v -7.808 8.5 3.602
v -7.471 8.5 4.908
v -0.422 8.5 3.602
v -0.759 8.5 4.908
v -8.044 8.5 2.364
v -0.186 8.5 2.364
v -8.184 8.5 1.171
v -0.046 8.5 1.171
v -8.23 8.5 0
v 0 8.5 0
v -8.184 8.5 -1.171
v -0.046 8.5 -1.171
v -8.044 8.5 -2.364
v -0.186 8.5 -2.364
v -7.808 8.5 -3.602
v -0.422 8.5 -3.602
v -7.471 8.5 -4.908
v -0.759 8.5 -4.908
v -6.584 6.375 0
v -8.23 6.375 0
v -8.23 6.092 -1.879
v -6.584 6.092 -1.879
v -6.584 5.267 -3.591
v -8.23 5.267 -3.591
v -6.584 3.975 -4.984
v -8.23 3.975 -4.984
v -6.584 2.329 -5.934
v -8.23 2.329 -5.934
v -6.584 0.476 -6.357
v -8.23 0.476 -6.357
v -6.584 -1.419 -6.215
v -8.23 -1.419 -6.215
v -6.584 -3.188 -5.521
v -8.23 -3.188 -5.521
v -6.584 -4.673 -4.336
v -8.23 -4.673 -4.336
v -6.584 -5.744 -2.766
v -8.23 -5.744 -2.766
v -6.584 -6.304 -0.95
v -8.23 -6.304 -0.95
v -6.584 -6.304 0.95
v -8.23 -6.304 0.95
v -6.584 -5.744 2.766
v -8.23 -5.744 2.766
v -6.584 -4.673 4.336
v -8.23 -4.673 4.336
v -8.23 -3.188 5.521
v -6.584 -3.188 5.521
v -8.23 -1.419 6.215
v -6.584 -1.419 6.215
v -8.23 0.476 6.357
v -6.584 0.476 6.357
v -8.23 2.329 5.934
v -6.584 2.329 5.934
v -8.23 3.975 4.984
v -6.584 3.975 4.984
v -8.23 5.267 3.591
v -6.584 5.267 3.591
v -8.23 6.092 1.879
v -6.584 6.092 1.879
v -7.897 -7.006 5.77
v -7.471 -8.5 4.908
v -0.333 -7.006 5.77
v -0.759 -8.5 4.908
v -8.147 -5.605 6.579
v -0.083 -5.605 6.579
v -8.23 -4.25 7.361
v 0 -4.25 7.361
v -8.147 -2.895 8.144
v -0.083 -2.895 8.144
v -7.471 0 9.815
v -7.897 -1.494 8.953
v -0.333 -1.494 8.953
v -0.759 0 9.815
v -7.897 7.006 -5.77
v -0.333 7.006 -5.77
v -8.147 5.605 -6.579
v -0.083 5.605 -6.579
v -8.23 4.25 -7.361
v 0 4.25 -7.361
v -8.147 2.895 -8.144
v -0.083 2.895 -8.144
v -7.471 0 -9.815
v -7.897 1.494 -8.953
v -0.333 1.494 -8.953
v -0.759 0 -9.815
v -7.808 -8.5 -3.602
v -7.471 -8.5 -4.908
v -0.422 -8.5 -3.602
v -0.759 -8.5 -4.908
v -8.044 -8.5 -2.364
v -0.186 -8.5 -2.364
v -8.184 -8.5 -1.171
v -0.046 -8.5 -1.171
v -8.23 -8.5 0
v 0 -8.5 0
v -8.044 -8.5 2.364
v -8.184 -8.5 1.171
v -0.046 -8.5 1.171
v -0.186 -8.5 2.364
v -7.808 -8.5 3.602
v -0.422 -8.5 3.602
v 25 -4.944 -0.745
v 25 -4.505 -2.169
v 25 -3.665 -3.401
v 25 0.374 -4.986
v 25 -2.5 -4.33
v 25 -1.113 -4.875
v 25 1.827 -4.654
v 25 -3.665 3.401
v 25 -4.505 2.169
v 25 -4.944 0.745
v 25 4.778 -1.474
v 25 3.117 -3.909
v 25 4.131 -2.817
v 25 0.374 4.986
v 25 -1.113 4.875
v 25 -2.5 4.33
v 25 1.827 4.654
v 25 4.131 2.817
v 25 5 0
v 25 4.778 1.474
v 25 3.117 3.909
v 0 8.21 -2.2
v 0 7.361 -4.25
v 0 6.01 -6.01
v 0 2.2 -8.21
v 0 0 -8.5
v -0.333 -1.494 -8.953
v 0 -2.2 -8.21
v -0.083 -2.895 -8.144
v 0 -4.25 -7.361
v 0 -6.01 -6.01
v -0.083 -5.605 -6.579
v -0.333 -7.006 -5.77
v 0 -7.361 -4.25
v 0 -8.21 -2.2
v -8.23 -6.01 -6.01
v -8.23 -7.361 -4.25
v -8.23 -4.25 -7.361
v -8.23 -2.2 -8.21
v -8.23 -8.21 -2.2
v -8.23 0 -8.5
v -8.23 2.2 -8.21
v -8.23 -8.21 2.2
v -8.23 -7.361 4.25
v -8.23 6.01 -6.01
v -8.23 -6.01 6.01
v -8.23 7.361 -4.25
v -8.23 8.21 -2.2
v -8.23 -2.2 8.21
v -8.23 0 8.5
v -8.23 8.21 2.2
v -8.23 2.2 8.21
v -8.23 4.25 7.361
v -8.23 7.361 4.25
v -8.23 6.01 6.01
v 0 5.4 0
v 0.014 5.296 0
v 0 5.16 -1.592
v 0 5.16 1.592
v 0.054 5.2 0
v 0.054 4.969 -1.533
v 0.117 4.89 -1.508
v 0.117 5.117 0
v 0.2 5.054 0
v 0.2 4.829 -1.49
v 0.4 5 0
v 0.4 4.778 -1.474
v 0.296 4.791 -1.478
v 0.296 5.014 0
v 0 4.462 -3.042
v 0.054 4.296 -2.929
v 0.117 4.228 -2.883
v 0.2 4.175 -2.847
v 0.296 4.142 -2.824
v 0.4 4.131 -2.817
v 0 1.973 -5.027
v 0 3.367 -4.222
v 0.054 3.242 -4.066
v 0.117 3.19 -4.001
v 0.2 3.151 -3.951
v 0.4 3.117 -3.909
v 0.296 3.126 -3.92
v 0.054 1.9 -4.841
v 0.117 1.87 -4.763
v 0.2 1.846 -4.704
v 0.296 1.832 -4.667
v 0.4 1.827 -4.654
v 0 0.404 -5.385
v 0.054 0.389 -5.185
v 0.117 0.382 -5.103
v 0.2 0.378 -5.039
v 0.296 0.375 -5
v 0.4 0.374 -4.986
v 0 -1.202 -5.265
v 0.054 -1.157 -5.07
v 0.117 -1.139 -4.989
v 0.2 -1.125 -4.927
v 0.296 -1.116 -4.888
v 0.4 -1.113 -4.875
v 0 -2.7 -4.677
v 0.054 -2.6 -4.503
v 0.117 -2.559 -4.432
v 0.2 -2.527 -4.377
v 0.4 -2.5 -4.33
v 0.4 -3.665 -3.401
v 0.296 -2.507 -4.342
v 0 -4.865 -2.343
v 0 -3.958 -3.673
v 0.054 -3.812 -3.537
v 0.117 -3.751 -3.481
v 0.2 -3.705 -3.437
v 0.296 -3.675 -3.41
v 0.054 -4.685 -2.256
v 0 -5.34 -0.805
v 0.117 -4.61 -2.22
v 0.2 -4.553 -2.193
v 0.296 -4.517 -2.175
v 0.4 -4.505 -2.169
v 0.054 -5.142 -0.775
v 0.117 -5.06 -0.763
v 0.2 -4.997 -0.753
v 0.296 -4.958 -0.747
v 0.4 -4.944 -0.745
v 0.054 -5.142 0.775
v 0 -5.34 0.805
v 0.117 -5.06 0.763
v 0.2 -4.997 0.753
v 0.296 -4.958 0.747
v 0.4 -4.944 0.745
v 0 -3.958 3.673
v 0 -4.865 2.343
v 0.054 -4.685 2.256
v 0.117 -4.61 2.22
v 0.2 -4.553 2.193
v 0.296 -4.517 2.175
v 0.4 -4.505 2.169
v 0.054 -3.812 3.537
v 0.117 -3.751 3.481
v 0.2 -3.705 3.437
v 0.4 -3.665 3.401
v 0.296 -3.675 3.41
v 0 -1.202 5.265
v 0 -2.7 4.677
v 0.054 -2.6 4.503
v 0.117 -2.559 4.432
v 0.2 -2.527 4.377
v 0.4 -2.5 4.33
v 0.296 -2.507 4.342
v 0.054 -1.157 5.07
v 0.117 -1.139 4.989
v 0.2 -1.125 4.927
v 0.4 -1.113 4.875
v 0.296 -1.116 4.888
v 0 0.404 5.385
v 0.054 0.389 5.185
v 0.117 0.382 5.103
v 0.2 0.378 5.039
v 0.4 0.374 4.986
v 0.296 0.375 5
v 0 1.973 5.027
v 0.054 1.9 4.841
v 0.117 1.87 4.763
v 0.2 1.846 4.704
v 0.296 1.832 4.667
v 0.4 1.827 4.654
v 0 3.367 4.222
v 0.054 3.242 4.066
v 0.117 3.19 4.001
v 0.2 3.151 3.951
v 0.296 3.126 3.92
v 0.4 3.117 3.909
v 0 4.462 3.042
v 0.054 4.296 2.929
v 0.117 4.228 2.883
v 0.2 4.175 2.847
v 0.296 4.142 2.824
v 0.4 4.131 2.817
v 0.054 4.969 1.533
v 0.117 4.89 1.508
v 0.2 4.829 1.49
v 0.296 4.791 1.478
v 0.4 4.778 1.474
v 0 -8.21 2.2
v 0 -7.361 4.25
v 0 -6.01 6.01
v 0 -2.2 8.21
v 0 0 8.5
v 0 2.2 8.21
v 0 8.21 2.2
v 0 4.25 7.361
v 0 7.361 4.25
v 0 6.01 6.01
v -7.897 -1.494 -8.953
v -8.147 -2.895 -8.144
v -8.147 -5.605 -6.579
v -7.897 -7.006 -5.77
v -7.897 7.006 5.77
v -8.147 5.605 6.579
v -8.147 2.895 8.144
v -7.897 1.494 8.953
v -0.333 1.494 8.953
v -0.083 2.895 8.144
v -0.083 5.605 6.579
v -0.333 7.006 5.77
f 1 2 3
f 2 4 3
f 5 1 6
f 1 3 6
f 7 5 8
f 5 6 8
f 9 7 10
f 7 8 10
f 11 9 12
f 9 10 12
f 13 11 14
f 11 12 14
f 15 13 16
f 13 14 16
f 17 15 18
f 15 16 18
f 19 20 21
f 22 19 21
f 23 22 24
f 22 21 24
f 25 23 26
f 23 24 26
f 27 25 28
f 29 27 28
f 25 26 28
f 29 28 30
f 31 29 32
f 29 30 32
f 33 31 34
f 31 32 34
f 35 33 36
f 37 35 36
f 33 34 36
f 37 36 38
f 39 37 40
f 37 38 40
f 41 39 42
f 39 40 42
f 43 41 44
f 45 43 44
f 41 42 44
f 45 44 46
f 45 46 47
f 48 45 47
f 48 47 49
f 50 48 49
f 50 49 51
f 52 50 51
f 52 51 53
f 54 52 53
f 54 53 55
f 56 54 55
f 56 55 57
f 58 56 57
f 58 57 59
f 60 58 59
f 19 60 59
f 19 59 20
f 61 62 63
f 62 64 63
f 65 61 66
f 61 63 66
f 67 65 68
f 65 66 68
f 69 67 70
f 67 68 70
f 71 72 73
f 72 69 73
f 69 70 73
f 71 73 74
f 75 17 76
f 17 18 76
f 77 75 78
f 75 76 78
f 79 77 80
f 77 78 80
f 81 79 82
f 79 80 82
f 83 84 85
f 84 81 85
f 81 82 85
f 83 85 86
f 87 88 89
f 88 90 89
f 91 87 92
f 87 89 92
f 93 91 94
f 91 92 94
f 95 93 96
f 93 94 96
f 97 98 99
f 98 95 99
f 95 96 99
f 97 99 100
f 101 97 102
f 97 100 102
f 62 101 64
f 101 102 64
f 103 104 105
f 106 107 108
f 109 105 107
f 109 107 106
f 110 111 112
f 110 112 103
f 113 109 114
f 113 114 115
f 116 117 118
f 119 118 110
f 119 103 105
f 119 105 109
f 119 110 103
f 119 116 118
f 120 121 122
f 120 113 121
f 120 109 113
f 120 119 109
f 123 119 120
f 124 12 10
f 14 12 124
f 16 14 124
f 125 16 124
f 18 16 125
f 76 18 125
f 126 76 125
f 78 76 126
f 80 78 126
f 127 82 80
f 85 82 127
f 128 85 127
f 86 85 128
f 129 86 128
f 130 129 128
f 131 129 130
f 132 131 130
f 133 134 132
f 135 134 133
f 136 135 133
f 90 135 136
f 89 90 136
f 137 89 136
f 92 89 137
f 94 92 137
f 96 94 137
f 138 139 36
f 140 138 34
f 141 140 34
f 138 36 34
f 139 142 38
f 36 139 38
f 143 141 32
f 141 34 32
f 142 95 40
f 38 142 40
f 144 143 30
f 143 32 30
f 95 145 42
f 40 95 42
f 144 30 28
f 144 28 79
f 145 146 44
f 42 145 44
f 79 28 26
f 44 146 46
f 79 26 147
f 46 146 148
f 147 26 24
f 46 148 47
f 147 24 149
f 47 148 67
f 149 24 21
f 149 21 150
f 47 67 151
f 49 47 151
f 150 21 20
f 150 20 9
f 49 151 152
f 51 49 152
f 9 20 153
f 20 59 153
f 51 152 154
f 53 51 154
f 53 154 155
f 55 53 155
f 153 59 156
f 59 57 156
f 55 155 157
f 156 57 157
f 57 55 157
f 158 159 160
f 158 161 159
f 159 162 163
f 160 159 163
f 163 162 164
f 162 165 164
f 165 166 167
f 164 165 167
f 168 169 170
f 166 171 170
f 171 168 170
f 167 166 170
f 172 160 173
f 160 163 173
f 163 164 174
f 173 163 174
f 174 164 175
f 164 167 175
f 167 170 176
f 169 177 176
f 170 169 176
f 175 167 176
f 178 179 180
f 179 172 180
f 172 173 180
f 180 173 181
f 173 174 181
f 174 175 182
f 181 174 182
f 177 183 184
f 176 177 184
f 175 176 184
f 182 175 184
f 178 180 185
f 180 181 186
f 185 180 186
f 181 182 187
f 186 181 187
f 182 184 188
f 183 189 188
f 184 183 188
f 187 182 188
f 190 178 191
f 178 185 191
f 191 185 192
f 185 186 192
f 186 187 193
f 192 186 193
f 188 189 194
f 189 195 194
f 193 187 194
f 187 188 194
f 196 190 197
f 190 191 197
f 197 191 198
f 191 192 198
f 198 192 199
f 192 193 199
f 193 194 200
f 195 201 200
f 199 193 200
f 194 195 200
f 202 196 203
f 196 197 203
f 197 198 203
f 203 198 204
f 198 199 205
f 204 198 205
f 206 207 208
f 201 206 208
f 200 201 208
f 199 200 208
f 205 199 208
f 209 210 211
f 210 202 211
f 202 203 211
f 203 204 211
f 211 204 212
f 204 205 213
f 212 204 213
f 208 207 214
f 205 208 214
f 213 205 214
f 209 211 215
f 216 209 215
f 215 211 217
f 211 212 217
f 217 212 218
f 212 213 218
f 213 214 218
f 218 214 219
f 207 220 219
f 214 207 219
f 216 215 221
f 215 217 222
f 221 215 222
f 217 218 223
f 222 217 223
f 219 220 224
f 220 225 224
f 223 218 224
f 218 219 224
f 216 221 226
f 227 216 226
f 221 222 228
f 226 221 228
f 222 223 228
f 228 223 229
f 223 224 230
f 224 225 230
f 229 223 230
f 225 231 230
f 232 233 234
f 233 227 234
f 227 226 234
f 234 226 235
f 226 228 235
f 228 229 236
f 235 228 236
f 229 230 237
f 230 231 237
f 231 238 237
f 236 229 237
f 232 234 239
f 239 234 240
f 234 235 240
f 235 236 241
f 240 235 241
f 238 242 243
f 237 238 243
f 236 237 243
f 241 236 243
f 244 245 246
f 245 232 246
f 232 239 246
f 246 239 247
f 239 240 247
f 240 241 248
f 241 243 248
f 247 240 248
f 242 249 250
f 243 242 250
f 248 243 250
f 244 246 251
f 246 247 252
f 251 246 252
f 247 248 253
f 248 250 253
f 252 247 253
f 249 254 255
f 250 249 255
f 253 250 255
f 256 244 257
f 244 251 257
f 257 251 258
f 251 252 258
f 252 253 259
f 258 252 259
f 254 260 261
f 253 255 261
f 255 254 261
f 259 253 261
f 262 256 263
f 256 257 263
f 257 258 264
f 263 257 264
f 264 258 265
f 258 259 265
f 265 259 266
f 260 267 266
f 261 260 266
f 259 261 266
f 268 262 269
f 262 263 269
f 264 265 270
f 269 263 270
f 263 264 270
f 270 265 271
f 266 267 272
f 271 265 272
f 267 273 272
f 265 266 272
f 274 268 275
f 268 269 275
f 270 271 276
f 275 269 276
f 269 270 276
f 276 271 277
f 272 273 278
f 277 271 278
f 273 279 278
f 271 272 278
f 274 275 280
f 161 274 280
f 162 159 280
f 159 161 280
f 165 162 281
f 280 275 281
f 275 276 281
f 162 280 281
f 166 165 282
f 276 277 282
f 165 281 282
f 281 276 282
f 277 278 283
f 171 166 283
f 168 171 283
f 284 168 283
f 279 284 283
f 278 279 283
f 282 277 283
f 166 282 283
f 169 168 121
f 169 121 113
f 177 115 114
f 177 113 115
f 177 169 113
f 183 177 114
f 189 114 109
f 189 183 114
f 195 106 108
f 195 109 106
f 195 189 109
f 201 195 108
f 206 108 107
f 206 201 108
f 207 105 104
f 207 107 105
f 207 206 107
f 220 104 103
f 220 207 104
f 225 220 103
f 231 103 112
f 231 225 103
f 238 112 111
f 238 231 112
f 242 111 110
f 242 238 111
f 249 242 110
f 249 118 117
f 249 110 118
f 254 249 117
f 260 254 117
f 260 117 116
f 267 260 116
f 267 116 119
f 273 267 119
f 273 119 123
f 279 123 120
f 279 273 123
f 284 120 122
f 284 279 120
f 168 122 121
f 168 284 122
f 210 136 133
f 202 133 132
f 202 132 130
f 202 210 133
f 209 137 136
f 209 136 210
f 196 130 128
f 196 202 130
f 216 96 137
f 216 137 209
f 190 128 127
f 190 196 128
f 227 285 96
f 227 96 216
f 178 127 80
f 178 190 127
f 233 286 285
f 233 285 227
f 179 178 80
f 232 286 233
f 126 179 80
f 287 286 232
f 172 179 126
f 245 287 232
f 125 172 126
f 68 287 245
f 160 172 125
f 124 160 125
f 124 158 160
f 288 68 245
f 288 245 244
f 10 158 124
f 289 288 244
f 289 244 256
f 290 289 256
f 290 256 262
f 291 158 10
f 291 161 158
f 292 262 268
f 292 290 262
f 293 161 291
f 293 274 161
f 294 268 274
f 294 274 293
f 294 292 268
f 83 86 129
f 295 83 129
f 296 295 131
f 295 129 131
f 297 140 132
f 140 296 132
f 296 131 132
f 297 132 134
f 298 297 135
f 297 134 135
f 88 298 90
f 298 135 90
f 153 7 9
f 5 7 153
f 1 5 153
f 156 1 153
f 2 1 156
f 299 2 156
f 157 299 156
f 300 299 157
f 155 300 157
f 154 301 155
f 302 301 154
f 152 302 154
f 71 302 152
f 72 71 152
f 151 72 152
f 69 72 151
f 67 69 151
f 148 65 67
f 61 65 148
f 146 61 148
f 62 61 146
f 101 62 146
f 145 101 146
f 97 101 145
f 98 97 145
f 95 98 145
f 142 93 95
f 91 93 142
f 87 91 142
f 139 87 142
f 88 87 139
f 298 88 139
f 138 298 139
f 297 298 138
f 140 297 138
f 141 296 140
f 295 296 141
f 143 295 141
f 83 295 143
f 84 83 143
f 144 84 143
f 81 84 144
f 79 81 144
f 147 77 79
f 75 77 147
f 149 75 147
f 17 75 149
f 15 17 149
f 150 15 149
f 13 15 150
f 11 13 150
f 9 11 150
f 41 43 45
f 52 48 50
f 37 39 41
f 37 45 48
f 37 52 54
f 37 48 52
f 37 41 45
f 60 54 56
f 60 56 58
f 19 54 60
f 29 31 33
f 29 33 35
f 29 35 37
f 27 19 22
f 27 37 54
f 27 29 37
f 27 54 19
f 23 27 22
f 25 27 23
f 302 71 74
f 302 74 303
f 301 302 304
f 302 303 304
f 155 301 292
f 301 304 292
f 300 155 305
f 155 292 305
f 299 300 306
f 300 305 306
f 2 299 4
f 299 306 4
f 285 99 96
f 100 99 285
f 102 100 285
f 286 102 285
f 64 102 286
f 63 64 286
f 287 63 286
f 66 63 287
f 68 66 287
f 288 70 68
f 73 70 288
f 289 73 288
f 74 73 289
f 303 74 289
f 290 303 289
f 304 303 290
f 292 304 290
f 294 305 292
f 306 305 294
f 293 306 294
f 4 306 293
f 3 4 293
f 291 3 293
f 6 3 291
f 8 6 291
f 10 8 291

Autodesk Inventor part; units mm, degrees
ref_plane "YZ Plane" through (0, 0, 0) normal (1, 0, 0) x (0, 1, 0)
ref_plane "XZ Plane" through (0, 0, 0) normal (0, 1, 0) x (-1, 0, 0)
sketch "Sketch1" plane through (0, 0, 0) normal (0, 0, 1) x (1, 0, 0)
  line L0 (0, 5) -> (0, 0)
  line L1 (0, 0) -> (25, 0)
  line L2 (25, 0) -> (25, 5)
  line L3 (25, 5) -> (0, 5)
  line L4 (-5, 0) -> (30, 0) projected
  line L5 (0, -1) -> (0, 6) projected
  dimension "d0" = 10
  dimension "d1" = 25
revolve "Body" add sketch "Sketch1" angle 360 about axis through (0, 0, 0) along (1, 0, 0)
sketch "Sketch2" plane through (0, 0, 0) normal (1, 0, 0) x (0, 1, 0)
  line L0 (0, 9.815) -> (8.5, 4.9075)
  line L1 (8.5, 4.9075) -> (8.5, -4.9075)
  line L2 (8.5, -4.9075) -> (0, -9.815)
  line L3 (0, -9.815) -> (-8.5, -4.9075)
  line L4 (-8.5, -4.9075) -> (-8.5, 4.9075)
  line L5 (-8.5, 4.9075) -> (0, 9.815)
  line L6 (-11.9, 0) -> (11.9, 0) projected
  line L7 (0, -13.7409) -> (0, 13.7409) projected
  point P0 (0, 0)
  point P1 (0, 0)
  dimension "d2" = 17
extrude "Head" add sketch "Sketch2" against normal blind 8.23
sketch "Sketch3" plane through (-8.23, 0, 0) normal (-1, 0, 0) x (0, 1, 0)
  circle A0 centre (0, 0) radius 6.375
  point P0 (0, 0)
  dimension "d12" = 12.75
extrude "Indent1" cut sketch "Sketch3" against normal blind 1.646
sketch "Sketch4" plane through (0, 0, 0) normal (0, 0, 1) x (1, 0, 0)
  line L0 (-8.23, 9.815) -> (-8.23, 8.5)
  line L1 (-8.23, 8.5) -> (-7.4708, 9.815)
  line L2 (-7.4708, 9.815) -> (-8.23, 9.815)
  line L3 (0, 9.815) -> (0, 8.5)
  line L4 (0, 8.5) -> (-0.7592, 9.815)
  line L5 (-0.7592, 9.815) -> (0, 9.815)
  line L6 (0, 0) -> (-8.23, 0) projected
  line L7 (-8.23, 0) -> (-8.23, 8.5) projected
  line L8 (0, 0) -> (0, 8.5) projected
  line L9 (-9.876, 0) -> (1.646, 0) projected
  line L10 (-7.4708, 9.815) -> (-0.7592, 9.815) construction
  line L11 (0, -1.963) -> (0, 11.7779) projected
  dimension "d6" = 30
  dimension "d7" = 30
  dimension "d16" = 17
  dimension "d17" = 17
  dimension "d18" = 19.6299
revolve "Chamfer1" cut sketch "Sketch4" angle 360 about axis through (-10, 0, 0) along (1, 0, 0)
fillet "Fillet1" radius 0.4 1 edges at (0, -5, 0)
thread "Thread" size "M10x1.5" class "6g" standard "ISO Metric profile" length 22
ref_plane "Work Plane1" through (3, 0, 0) normal (0, 0.5, 0.866) x (1, 0, 0)
equation "\"d0\" = GD"
equation "\"d1\" = NLG"
equation "\"d2\" = SW"
equation "\"d3\" = KOH"
equation "\"d12\" = 0.75 * SW0"
equation "\"d14\" = 0.2 * KOH"
equation "\"d6\" = ANG1"
equation "\"d7\" = ANG1"
equation "\"d16\" = SW0"
equation "\"d17\" = SW0"
equation "\"d18\" = 1.1547 * SW"
equation "\"d11\" = RR"
equation "\"d8\" = GEL"
equation "\"NLG\" = 25"
equation "\"KOH\" = 8.23"
equation "\"GD\" = NND"
equation "\"GEL\" = 22"
equation "\"SW\" = 17"
equation "\"SW0\" = SW"
equation "\"ANG1\" = 30deg"
equation "\"RR\" = 0.4"
equation "\"GUL\" = 0.61345 * PTC"
equation "\"SPD\" = NND - 1.2269 * PTC"
equation "\"GD1\" = THREADDIA - 1.2269 * PTC"
equation "\"SDH\" = 11.2"
equation "\"TOA\" = 30deg"
equation "\"FAWI\" = 45deg"
equation "\"PTC\" = 1.5"
equation "\"GAL\" = 0.61345 * PTC"
equation "\"SD\" = 0"
equation "\"SD2\" = SDH"
equation "\"E0\" = 1.155 * SW"
equation "\"NND\" = 10"
equation "\"THREADDIA\" = 10"
properties part number "AS 1427 - M10 x 25" material "Steel, Mild"
